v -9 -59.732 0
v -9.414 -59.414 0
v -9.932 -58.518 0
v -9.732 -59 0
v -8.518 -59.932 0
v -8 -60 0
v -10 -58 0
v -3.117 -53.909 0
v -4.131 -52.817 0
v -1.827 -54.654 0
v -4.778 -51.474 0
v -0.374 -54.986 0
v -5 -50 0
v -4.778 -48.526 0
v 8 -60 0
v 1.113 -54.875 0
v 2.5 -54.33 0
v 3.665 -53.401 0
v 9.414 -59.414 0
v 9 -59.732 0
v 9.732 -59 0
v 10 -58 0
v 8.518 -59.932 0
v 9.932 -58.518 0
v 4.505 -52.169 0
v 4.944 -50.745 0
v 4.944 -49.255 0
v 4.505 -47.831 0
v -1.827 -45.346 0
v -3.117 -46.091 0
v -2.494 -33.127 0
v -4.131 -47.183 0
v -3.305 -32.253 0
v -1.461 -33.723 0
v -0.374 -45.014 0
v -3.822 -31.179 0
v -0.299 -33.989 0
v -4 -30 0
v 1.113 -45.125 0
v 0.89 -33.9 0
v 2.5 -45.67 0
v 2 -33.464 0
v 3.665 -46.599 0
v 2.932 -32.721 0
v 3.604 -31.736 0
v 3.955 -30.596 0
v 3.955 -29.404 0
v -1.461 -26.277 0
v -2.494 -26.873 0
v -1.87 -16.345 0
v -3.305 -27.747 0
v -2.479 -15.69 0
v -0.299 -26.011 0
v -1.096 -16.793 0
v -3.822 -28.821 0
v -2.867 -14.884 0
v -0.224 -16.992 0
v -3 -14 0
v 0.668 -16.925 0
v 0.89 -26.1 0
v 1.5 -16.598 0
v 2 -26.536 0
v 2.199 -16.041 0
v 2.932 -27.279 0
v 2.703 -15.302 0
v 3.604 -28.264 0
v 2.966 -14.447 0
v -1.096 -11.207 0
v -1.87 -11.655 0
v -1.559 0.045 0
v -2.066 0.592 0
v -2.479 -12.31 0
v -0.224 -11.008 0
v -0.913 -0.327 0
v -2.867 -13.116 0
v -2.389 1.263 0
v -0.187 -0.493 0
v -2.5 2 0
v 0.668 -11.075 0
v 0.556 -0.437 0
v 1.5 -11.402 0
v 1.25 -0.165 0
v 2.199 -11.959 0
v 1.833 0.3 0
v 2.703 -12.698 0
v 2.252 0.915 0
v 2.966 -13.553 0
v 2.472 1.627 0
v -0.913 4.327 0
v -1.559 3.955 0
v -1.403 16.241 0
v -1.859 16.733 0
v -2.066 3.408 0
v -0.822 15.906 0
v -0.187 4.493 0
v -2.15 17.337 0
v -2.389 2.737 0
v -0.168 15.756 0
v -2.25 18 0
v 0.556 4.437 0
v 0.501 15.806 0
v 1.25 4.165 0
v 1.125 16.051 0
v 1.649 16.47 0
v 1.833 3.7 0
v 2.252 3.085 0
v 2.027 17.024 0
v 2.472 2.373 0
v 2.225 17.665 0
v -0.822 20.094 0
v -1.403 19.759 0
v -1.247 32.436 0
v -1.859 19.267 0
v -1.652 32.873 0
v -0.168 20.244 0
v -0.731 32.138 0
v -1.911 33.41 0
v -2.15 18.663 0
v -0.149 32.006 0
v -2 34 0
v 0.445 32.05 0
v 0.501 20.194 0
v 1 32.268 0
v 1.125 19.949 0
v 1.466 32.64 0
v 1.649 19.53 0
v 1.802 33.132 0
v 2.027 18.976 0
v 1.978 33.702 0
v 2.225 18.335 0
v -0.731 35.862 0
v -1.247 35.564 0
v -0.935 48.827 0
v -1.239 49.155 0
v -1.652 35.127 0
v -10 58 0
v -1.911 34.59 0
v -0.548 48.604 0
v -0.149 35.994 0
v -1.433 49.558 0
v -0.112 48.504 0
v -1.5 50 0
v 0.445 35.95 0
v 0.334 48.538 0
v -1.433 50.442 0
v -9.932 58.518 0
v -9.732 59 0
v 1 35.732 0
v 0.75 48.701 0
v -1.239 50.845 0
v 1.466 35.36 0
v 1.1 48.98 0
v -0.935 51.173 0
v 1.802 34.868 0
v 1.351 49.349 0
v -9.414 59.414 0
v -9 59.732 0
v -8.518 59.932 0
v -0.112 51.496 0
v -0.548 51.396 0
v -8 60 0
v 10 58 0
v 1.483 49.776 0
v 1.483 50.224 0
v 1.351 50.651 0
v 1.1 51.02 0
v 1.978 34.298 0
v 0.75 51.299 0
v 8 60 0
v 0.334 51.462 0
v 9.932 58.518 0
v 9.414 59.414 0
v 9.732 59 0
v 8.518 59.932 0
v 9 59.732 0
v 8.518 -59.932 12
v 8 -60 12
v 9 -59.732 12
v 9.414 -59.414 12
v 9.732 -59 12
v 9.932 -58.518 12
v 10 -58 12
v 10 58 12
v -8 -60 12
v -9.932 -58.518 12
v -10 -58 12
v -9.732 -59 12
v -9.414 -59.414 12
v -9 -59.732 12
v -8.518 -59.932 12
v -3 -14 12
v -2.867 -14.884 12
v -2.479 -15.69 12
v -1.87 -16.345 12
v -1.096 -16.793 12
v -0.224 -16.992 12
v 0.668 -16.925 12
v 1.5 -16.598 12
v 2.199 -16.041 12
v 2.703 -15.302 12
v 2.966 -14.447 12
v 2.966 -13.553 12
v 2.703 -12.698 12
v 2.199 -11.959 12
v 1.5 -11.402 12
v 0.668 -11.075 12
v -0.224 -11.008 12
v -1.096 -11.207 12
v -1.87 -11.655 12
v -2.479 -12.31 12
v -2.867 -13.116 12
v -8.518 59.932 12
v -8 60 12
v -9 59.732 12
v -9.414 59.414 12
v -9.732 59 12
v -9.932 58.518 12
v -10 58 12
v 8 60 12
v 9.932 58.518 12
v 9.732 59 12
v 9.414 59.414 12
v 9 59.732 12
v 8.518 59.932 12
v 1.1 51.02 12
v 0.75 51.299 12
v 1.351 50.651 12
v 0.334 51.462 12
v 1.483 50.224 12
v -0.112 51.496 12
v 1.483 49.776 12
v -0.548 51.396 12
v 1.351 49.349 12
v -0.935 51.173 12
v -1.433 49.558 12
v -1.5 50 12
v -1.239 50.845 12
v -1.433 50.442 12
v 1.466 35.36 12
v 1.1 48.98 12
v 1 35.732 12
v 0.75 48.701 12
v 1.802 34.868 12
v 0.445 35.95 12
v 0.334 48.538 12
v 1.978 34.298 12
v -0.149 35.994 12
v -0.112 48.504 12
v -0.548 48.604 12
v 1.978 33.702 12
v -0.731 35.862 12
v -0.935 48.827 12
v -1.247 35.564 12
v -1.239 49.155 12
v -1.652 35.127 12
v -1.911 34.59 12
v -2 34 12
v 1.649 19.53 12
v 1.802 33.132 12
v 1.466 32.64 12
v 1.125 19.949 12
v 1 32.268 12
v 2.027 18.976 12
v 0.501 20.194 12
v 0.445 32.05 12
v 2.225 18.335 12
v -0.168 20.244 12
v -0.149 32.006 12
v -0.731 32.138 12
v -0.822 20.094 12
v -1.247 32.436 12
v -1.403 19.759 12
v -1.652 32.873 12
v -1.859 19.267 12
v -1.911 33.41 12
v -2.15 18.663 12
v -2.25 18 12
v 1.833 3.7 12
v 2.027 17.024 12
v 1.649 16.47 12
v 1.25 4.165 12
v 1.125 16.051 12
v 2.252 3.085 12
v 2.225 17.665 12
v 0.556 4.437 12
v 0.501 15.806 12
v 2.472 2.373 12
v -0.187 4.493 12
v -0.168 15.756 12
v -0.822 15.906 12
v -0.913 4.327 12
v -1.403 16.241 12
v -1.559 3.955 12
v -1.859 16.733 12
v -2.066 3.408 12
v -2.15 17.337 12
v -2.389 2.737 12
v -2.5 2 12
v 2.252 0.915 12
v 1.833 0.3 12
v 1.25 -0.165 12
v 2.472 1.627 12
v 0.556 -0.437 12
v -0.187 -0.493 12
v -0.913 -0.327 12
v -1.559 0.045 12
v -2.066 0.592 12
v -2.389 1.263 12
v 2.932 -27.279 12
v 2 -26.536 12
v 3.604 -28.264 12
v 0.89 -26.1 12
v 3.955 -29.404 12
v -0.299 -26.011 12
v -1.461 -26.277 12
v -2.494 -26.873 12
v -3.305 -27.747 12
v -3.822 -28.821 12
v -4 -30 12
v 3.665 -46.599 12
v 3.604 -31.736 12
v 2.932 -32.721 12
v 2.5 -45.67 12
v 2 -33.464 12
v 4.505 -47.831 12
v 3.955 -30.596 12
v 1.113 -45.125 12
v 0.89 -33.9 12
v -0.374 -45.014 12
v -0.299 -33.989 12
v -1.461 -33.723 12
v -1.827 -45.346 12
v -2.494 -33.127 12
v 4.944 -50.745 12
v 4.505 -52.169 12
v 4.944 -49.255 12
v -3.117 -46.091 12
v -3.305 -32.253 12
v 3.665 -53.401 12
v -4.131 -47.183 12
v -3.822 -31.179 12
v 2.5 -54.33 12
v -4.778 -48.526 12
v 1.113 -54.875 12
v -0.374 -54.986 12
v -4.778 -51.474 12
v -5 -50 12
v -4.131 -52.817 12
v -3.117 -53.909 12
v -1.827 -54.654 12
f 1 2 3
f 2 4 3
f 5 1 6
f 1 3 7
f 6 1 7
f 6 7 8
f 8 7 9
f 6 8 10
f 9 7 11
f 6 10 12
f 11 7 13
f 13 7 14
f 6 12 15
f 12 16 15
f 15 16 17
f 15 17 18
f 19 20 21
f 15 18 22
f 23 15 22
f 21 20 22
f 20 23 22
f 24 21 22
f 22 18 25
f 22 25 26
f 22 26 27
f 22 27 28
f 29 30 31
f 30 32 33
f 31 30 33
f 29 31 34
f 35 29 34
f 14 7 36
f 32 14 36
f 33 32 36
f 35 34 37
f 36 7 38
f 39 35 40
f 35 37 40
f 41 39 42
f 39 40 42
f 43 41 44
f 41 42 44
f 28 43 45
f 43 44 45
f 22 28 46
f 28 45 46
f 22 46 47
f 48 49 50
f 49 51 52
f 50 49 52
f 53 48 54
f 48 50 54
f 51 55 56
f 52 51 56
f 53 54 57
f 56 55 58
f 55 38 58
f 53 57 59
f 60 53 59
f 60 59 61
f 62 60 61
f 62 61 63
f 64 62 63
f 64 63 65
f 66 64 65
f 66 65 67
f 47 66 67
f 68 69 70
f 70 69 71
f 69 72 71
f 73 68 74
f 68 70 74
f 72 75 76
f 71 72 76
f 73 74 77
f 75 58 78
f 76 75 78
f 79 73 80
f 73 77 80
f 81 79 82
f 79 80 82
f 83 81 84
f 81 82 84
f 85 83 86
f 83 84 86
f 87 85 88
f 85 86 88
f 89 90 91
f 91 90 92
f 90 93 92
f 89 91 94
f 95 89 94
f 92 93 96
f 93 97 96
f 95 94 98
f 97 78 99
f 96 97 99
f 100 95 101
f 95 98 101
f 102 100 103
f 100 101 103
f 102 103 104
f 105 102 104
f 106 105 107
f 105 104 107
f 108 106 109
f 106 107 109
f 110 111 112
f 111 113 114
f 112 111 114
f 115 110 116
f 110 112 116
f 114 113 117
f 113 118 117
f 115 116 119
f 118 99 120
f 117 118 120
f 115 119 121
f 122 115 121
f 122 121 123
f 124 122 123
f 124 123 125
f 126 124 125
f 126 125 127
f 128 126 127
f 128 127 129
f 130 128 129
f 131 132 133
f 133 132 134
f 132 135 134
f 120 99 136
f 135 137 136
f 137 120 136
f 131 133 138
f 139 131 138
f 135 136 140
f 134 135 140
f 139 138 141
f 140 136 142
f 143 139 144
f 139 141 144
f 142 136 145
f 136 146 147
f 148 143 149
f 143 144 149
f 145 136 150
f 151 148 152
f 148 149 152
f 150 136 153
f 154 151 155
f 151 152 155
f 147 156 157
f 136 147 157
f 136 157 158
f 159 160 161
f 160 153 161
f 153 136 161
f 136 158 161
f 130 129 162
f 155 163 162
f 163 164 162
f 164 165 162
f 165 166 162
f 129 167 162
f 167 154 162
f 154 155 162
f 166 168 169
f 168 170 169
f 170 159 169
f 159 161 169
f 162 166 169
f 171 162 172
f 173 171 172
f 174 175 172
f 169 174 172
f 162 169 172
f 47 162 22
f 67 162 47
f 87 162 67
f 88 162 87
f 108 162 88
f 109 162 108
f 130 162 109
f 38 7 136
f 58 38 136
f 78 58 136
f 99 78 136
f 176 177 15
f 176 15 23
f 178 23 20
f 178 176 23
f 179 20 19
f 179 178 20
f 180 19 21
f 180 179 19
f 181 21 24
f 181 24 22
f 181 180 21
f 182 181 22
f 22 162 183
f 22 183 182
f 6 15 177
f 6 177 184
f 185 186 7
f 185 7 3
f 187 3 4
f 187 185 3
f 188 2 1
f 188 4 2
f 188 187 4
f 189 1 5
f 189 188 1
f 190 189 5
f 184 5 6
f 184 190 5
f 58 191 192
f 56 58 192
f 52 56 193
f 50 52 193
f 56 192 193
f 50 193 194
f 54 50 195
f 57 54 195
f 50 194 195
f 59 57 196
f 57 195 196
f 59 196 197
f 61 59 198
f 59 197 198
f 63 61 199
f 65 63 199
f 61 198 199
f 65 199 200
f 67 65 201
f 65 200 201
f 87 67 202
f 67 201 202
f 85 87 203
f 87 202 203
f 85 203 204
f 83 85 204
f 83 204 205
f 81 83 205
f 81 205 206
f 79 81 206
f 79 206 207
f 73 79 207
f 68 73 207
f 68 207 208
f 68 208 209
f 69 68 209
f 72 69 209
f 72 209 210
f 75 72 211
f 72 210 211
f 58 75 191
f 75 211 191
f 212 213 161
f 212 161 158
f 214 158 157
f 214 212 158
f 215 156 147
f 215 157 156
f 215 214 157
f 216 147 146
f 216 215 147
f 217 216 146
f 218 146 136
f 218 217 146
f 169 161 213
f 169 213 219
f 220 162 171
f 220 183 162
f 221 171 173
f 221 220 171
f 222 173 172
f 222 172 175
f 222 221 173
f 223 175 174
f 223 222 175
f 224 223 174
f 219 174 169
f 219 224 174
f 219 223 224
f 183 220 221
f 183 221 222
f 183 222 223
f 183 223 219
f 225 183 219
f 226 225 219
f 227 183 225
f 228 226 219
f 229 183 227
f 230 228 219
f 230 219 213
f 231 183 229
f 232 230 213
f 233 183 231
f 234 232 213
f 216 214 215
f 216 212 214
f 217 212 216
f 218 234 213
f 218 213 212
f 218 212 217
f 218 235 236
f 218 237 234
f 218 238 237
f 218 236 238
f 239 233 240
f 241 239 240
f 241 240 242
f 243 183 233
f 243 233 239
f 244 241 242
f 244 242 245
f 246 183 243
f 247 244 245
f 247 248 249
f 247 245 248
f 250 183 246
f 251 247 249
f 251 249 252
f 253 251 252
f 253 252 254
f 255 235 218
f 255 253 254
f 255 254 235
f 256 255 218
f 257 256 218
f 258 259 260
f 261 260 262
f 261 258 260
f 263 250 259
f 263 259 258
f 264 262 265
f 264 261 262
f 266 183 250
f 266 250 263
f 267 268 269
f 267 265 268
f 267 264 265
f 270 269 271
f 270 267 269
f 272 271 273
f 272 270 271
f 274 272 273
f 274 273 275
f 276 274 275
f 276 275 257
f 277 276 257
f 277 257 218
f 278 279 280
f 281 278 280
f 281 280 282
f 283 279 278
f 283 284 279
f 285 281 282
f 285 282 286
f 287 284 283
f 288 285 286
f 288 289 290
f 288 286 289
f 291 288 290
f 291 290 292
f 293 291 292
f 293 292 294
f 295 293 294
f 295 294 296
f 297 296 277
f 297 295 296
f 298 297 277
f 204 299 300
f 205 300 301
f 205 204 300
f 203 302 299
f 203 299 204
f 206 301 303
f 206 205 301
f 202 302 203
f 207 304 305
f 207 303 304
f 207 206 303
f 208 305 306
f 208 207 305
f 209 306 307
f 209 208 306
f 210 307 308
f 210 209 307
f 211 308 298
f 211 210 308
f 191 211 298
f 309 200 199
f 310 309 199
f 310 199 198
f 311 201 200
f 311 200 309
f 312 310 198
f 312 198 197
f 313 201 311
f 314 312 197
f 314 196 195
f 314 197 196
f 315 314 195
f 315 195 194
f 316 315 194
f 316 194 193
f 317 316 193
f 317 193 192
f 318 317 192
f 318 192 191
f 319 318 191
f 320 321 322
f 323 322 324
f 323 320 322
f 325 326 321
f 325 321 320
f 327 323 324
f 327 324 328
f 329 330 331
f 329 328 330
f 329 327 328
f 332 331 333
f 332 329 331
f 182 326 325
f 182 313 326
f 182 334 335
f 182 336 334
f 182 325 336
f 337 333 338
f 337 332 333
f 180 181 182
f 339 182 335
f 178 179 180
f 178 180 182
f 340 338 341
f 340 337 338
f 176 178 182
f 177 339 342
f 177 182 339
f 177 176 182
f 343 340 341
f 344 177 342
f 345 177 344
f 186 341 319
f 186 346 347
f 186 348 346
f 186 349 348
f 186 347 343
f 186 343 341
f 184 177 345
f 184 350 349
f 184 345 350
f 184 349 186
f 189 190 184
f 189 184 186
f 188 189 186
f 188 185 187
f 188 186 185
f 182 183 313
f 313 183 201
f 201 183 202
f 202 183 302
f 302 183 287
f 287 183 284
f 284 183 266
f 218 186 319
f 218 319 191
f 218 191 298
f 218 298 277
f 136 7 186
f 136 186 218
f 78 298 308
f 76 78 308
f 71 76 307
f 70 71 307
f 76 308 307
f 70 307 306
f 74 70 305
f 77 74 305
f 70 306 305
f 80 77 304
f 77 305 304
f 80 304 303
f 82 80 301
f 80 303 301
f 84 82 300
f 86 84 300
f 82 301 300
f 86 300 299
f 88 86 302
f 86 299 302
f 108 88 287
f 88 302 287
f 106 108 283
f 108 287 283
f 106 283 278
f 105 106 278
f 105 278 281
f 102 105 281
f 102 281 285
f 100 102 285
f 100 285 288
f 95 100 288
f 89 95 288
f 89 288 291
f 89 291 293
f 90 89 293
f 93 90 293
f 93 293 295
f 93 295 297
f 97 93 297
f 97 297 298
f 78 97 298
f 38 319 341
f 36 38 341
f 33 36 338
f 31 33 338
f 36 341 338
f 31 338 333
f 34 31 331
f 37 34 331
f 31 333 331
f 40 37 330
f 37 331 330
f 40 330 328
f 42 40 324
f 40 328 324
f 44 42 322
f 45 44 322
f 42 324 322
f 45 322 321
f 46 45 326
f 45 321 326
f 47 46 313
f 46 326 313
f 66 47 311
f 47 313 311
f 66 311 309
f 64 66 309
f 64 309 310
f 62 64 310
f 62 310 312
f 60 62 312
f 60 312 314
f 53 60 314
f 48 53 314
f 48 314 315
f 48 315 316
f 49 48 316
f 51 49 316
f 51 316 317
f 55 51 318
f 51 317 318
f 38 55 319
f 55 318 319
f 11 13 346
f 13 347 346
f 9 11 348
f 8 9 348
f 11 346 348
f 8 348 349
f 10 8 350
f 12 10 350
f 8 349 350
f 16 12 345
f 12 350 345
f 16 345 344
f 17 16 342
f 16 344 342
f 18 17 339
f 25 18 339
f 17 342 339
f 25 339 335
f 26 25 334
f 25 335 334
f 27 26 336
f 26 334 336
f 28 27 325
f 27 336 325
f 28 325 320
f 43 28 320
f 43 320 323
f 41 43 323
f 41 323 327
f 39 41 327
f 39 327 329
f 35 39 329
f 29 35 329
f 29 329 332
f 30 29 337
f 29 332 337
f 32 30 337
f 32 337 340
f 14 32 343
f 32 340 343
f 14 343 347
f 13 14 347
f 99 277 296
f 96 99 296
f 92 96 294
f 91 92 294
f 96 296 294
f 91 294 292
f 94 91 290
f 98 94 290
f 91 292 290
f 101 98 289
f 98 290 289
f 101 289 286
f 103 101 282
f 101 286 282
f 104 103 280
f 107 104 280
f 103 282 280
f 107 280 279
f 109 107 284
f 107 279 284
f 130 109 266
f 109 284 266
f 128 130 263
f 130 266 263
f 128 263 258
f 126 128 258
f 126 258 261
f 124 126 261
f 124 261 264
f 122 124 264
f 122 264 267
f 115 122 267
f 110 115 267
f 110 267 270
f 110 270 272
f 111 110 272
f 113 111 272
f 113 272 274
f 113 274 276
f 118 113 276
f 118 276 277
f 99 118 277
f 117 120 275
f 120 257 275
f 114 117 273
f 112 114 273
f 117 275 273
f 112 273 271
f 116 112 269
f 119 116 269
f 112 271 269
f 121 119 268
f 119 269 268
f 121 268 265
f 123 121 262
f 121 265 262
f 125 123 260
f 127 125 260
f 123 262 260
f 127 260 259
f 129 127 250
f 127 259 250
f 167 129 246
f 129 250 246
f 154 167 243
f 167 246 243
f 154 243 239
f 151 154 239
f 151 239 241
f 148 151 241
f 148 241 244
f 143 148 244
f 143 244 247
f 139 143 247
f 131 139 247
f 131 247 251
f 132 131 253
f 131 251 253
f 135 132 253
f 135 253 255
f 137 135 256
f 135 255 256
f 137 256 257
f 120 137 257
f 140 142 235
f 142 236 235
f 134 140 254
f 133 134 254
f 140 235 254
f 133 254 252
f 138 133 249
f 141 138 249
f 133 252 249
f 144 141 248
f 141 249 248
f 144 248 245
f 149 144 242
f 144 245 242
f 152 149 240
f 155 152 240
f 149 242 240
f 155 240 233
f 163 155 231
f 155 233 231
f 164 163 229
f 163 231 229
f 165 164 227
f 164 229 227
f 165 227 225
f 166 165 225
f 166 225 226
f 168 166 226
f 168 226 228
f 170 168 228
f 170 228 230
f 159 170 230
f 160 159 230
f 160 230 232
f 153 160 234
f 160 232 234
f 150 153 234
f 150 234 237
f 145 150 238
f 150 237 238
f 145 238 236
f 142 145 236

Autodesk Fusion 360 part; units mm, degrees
sketch "Sketch1" plane through (0, 0, 0) normal (0, 0, 1) x (1, 0, 0)
  line L0 (10, -60) -> (-10, -60)
  line L1 (-10, -60) -> (-10, 60)
  line L2 (-10, 60) -> (10, 60)
  line L3 (10, 60) -> (10, -60)
  line L4 (10, -60) -> (-10, 60) construction
  line L5 (-10, -60) -> (10, 60) construction
  dimension "d1" = 20
  dimension "d2" = 120
extrude "Extrude1" add sketch "Sketch1" along normal blind 12
sketch "Sketch2" plane through (0, 0, 12) normal (0, 0, 1) x (-1, 0, 0)
  line L0 (-10, -60) -> (10, -60)
  line L1 (10, -60) -> (10, 60)
  line L2 (10, 60) -> (-10, 60)
  line L3 (-10, 60) -> (-10, -60)
  circle A0 centre (0, -50) radius 2
  circle A1 centre (0, 50) radius 2
extrude "Extrude2" cut sketch "Sketch2" against normal blind 12 contours A0
sketch "Sketch3" plane through (0, 0, 12) normal (0, 0, 1) x (-1, 0, 0)
  circle A0 centre (0, -50) radius 2
  line L0 (-10, -60) -> (10, -60)
  line L1 (10, -60) -> (10, 60)
  line L2 (10, 60) -> (-10, 60)
  line L3 (-10, 60) -> (-10, -60)
  circle A1 centre (0, 50) radius 2
  dimension "d10" = 4
extrude "Extrude3" cut sketch "Sketch3" against normal blind 12 contours A1
sketch "Sketch4" plane through (0, 0, 12) normal (0, 0, 1) x (-1, 0, 0)
  circle A0 centre (0, 50) radius 2
  circle A1 centre (0, -50) radius 2
  line L0 (-10, -60) -> (10, -60)
  line L1 (10, -60) -> (10, 60)
  line L2 (10, 60) -> (-10, 60)
  line L3 (-10, 60) -> (-10, -60)
  circle A2 centre (0, -34) radius 2
  circle A3 centre (0, -18) radius 2
  circle A4 centre (0, -2) radius 2
  circle A5 centre (0, 14) radius 2
  circle A6 centre (0, 30) radius 2
  point P0 (0, -34)
  point P1 (0, -18)
  point P2 (0, -2)
  point P3 (0, 14)
  point P4 (0, 30)
  point P5 (0, -18)
  point P6 (0, -2)
  point P7 (0, 14)
  point P8 (0, 30)
  point P9 (0, 46)
  dimension "d15" = 0
  dimension "d16" = 80
  dimension "d19" = 0
  dimension "d20" = 80
extrude "Extrude4" cut sketch "Sketch4" against normal blind 12 contours A2 | A3 | A4 | A5 | A6
sketch "Sketch5" plane through (0, 0, 12) normal (0, 0, 1) x (-1, 0, 0)
  line L0 (-10, -60) -> (10, -60)
  line L1 (10, -60) -> (10, 60)
  line L2 (10, 60) -> (-10, 60)
  line L3 (-10, 60) -> (-10, -60)
  circle A0 centre (0, -50) radius 2
  circle A1 centre (0, 50) radius 2
  circle A2 centre (0, 30) radius 2
  circle A3 centre (0, -34) radius 2
  circle A4 centre (0, 14) radius 2
  circle A5 centre (0, -18) radius 2
  circle A6 centre (0, -2) radius 2
sketch "Sketch6" plane through (0, 0, 12) normal (0, 0, 1) x (1, 0, 0)
  circle A0 centre (0, 50) radius 1.5
  circle A1 centre (0, 18) radius 2.25
  circle A2 centre (0, 2) radius 2.5
  circle A3 centre (0, -14) radius 3
  circle A4 centre (0, -30) radius 4
  circle A5 centre (0, -50) radius 5
  dimension "d26" = 3
  dimension "d27" = 4.5
  dimension "d28" = 5
  dimension "d29" = 6
  dimension "d30" = 8
  dimension "d31" = 10
extrude "Extrude5" add sketch "Sketch5" against normal blind 12 contours A0
extrude "Extrude6" add sketch "Sketch6" along normal blind 12 contours A0
extrude "Extrude7" cut 1 faces at (-0.1827, 50.4654, 24) along direction (0, 0, -1) blind 12
sketch "Sketch7" plane through (0, 0, 12) normal (0, 0, 1) x (-1, 0, 0)
  line L0 (-10, -60) -> (10, -60)
  line L1 (10, -60) -> (10, 60)
  line L2 (10, 60) -> (-10, 60)
  line L3 (-10, 60) -> (-10, -60)
  circle A0 centre (0, 50) radius 2
  circle A1 centre (0, 30) radius 2
  circle A2 centre (0, -34) radius 2
  circle A3 centre (0, 14) radius 2
  circle A4 centre (0, -18) radius 2
  circle A5 centre (0, -2) radius 2
  circle A6 centre (0, -50) radius 1.5
  dimension "d38" = 3
extrude "Extrude8" cut sketch "Sketch7" against normal blind 12 contours A6
sketch "Sketch8" plane through (0, 0, 12) normal (0, 0, 1) x (-1, 0, 0)
  circle A0 centre (0, -50) radius 1.5
  line L0 (-10, -60) -> (10, -60)
  line L1 (10, -60) -> (10, 60)
  line L2 (10, 60) -> (-10, 60)
  line L3 (-10, 60) -> (-10, -60)
  circle A1 centre (0, 50) radius 2
  circle A2 centre (0, 30) radius 2
  circle A3 centre (0, -34) radius 2
  circle A4 centre (0, 14) radius 2
  circle A5 centre (0, -18) radius 2
  circle A6 centre (0, -2) radius 2
  circle A7 centre (0, -18) radius 2.25
  circle A8 centre (0, -2) radius 2.5
  circle A9 centre (0, 14) radius 3
  circle A10 centre (0, 30) radius 4
  circle A11 centre (0, 50) radius 5
  dimension "d41" = 4.5
  dimension "d42" = 5
  dimension "d43" = 6
  dimension "d44" = 8
  dimension "d45" = 10
extrude "Extrude9" cut sketch "Sketch8" against normal blind 12 contours A11
sketch "Sketch9" plane through (0, 0, 12) normal (0, 0, 1) x (-1, 0, 0)
  circle A0 centre (0, -2) radius 2
  circle A1 centre (0, -18) radius 2
  circle A2 centre (0, 14) radius 2
  circle A3 centre (0, -34) radius 2
  circle A4 centre (0, 30) radius 2
  line L0 (-10, -60) -> (10, -60)
  line L1 (10, -60) -> (10, 60)
  line L2 (10, 60) -> (-10, 60)
  line L3 (-10, 60) -> (-10, -60)
  circle A5 centre (0, -50) radius 1.5
  circle A6 centre (0, 50) radius 5
  circle A7 centre (0, 30) radius 4
  dimension "d48" = 8
extrude "Extrude10" cut sketch "Sketch9" against normal blind 12 contours A7
sketch "Sketch10" plane through (0, 0, 12) normal (0, 0, 1) x (-1, 0, 0)
  circle A0 centre (0, 50) radius 5
  circle A1 centre (0, -50) radius 1.5
  line L0 (-10, -60) -> (10, -60)
  line L1 (10, -60) -> (10, 60)
  line L2 (10, 60) -> (-10, 60)
  line L3 (-10, 60) -> (-10, -60)
  circle A2 centre (0, -34) radius 2
  circle A3 centre (0, 14) radius 2
  circle A4 centre (0, -18) radius 2
  circle A5 centre (0, -2) radius 2
  circle A6 centre (0, 30) radius 4
  circle A7 centre (0, 14) radius 3
  dimension "d51" = 6
extrude "Extrude11" cut sketch "Sketch10" against normal blind 12 contours A7
sketch "Sketch11" plane through (0, 0, 12) normal (0, 0, 1) x (-1, 0, 0)
  circle A0 centre (0, 30) radius 4
  circle A1 centre (0, -2) radius 2
  circle A2 centre (0, -18) radius 2
  circle A3 centre (0, -34) radius 2
  line L0 (-10, -60) -> (10, -60)
  line L1 (10, -60) -> (10, 60)
  line L2 (10, 60) -> (-10, 60)
  line L3 (-10, 60) -> (-10, -60)
  circle A4 centre (0, -50) radius 1.5
  circle A5 centre (0, 50) radius 5
  circle A6 centre (0, 14) radius 3
  circle A7 centre (0, -2) radius 2.5
  dimension "d54" = 5
extrude "Extrude12" cut sketch "Sketch11" against normal blind 12 contours A7
sketch "Sketch12" plane through (0, 0, 12) normal (0, 0, 1) x (-1, 0, 0)
  circle A0 centre (0, 14) radius 3
  circle A1 centre (0, 50) radius 5
  circle A2 centre (0, -50) radius 1.5
  line L0 (-10, -60) -> (10, -60)
  line L1 (10, -60) -> (10, 60)
  line L2 (10, 60) -> (-10, 60)
  line L3 (-10, 60) -> (-10, -60)
  circle A3 centre (0, -34) radius 2
  circle A4 centre (0, -18) radius 2
  circle A5 centre (0, 30) radius 4
  circle A6 centre (0, -2) radius 2.5
  circle A7 centre (0, -18) radius 2.25
  dimension "d57" = 4.5
extrude "Extrude13" cut sketch "Sketch12" against normal blind 12 contours A7
fillet "Fillet1" radius 2 4 edges at (-10, -60, 6) (-10, 60, 6) (10, 60, 6) (10, -60, 6)
